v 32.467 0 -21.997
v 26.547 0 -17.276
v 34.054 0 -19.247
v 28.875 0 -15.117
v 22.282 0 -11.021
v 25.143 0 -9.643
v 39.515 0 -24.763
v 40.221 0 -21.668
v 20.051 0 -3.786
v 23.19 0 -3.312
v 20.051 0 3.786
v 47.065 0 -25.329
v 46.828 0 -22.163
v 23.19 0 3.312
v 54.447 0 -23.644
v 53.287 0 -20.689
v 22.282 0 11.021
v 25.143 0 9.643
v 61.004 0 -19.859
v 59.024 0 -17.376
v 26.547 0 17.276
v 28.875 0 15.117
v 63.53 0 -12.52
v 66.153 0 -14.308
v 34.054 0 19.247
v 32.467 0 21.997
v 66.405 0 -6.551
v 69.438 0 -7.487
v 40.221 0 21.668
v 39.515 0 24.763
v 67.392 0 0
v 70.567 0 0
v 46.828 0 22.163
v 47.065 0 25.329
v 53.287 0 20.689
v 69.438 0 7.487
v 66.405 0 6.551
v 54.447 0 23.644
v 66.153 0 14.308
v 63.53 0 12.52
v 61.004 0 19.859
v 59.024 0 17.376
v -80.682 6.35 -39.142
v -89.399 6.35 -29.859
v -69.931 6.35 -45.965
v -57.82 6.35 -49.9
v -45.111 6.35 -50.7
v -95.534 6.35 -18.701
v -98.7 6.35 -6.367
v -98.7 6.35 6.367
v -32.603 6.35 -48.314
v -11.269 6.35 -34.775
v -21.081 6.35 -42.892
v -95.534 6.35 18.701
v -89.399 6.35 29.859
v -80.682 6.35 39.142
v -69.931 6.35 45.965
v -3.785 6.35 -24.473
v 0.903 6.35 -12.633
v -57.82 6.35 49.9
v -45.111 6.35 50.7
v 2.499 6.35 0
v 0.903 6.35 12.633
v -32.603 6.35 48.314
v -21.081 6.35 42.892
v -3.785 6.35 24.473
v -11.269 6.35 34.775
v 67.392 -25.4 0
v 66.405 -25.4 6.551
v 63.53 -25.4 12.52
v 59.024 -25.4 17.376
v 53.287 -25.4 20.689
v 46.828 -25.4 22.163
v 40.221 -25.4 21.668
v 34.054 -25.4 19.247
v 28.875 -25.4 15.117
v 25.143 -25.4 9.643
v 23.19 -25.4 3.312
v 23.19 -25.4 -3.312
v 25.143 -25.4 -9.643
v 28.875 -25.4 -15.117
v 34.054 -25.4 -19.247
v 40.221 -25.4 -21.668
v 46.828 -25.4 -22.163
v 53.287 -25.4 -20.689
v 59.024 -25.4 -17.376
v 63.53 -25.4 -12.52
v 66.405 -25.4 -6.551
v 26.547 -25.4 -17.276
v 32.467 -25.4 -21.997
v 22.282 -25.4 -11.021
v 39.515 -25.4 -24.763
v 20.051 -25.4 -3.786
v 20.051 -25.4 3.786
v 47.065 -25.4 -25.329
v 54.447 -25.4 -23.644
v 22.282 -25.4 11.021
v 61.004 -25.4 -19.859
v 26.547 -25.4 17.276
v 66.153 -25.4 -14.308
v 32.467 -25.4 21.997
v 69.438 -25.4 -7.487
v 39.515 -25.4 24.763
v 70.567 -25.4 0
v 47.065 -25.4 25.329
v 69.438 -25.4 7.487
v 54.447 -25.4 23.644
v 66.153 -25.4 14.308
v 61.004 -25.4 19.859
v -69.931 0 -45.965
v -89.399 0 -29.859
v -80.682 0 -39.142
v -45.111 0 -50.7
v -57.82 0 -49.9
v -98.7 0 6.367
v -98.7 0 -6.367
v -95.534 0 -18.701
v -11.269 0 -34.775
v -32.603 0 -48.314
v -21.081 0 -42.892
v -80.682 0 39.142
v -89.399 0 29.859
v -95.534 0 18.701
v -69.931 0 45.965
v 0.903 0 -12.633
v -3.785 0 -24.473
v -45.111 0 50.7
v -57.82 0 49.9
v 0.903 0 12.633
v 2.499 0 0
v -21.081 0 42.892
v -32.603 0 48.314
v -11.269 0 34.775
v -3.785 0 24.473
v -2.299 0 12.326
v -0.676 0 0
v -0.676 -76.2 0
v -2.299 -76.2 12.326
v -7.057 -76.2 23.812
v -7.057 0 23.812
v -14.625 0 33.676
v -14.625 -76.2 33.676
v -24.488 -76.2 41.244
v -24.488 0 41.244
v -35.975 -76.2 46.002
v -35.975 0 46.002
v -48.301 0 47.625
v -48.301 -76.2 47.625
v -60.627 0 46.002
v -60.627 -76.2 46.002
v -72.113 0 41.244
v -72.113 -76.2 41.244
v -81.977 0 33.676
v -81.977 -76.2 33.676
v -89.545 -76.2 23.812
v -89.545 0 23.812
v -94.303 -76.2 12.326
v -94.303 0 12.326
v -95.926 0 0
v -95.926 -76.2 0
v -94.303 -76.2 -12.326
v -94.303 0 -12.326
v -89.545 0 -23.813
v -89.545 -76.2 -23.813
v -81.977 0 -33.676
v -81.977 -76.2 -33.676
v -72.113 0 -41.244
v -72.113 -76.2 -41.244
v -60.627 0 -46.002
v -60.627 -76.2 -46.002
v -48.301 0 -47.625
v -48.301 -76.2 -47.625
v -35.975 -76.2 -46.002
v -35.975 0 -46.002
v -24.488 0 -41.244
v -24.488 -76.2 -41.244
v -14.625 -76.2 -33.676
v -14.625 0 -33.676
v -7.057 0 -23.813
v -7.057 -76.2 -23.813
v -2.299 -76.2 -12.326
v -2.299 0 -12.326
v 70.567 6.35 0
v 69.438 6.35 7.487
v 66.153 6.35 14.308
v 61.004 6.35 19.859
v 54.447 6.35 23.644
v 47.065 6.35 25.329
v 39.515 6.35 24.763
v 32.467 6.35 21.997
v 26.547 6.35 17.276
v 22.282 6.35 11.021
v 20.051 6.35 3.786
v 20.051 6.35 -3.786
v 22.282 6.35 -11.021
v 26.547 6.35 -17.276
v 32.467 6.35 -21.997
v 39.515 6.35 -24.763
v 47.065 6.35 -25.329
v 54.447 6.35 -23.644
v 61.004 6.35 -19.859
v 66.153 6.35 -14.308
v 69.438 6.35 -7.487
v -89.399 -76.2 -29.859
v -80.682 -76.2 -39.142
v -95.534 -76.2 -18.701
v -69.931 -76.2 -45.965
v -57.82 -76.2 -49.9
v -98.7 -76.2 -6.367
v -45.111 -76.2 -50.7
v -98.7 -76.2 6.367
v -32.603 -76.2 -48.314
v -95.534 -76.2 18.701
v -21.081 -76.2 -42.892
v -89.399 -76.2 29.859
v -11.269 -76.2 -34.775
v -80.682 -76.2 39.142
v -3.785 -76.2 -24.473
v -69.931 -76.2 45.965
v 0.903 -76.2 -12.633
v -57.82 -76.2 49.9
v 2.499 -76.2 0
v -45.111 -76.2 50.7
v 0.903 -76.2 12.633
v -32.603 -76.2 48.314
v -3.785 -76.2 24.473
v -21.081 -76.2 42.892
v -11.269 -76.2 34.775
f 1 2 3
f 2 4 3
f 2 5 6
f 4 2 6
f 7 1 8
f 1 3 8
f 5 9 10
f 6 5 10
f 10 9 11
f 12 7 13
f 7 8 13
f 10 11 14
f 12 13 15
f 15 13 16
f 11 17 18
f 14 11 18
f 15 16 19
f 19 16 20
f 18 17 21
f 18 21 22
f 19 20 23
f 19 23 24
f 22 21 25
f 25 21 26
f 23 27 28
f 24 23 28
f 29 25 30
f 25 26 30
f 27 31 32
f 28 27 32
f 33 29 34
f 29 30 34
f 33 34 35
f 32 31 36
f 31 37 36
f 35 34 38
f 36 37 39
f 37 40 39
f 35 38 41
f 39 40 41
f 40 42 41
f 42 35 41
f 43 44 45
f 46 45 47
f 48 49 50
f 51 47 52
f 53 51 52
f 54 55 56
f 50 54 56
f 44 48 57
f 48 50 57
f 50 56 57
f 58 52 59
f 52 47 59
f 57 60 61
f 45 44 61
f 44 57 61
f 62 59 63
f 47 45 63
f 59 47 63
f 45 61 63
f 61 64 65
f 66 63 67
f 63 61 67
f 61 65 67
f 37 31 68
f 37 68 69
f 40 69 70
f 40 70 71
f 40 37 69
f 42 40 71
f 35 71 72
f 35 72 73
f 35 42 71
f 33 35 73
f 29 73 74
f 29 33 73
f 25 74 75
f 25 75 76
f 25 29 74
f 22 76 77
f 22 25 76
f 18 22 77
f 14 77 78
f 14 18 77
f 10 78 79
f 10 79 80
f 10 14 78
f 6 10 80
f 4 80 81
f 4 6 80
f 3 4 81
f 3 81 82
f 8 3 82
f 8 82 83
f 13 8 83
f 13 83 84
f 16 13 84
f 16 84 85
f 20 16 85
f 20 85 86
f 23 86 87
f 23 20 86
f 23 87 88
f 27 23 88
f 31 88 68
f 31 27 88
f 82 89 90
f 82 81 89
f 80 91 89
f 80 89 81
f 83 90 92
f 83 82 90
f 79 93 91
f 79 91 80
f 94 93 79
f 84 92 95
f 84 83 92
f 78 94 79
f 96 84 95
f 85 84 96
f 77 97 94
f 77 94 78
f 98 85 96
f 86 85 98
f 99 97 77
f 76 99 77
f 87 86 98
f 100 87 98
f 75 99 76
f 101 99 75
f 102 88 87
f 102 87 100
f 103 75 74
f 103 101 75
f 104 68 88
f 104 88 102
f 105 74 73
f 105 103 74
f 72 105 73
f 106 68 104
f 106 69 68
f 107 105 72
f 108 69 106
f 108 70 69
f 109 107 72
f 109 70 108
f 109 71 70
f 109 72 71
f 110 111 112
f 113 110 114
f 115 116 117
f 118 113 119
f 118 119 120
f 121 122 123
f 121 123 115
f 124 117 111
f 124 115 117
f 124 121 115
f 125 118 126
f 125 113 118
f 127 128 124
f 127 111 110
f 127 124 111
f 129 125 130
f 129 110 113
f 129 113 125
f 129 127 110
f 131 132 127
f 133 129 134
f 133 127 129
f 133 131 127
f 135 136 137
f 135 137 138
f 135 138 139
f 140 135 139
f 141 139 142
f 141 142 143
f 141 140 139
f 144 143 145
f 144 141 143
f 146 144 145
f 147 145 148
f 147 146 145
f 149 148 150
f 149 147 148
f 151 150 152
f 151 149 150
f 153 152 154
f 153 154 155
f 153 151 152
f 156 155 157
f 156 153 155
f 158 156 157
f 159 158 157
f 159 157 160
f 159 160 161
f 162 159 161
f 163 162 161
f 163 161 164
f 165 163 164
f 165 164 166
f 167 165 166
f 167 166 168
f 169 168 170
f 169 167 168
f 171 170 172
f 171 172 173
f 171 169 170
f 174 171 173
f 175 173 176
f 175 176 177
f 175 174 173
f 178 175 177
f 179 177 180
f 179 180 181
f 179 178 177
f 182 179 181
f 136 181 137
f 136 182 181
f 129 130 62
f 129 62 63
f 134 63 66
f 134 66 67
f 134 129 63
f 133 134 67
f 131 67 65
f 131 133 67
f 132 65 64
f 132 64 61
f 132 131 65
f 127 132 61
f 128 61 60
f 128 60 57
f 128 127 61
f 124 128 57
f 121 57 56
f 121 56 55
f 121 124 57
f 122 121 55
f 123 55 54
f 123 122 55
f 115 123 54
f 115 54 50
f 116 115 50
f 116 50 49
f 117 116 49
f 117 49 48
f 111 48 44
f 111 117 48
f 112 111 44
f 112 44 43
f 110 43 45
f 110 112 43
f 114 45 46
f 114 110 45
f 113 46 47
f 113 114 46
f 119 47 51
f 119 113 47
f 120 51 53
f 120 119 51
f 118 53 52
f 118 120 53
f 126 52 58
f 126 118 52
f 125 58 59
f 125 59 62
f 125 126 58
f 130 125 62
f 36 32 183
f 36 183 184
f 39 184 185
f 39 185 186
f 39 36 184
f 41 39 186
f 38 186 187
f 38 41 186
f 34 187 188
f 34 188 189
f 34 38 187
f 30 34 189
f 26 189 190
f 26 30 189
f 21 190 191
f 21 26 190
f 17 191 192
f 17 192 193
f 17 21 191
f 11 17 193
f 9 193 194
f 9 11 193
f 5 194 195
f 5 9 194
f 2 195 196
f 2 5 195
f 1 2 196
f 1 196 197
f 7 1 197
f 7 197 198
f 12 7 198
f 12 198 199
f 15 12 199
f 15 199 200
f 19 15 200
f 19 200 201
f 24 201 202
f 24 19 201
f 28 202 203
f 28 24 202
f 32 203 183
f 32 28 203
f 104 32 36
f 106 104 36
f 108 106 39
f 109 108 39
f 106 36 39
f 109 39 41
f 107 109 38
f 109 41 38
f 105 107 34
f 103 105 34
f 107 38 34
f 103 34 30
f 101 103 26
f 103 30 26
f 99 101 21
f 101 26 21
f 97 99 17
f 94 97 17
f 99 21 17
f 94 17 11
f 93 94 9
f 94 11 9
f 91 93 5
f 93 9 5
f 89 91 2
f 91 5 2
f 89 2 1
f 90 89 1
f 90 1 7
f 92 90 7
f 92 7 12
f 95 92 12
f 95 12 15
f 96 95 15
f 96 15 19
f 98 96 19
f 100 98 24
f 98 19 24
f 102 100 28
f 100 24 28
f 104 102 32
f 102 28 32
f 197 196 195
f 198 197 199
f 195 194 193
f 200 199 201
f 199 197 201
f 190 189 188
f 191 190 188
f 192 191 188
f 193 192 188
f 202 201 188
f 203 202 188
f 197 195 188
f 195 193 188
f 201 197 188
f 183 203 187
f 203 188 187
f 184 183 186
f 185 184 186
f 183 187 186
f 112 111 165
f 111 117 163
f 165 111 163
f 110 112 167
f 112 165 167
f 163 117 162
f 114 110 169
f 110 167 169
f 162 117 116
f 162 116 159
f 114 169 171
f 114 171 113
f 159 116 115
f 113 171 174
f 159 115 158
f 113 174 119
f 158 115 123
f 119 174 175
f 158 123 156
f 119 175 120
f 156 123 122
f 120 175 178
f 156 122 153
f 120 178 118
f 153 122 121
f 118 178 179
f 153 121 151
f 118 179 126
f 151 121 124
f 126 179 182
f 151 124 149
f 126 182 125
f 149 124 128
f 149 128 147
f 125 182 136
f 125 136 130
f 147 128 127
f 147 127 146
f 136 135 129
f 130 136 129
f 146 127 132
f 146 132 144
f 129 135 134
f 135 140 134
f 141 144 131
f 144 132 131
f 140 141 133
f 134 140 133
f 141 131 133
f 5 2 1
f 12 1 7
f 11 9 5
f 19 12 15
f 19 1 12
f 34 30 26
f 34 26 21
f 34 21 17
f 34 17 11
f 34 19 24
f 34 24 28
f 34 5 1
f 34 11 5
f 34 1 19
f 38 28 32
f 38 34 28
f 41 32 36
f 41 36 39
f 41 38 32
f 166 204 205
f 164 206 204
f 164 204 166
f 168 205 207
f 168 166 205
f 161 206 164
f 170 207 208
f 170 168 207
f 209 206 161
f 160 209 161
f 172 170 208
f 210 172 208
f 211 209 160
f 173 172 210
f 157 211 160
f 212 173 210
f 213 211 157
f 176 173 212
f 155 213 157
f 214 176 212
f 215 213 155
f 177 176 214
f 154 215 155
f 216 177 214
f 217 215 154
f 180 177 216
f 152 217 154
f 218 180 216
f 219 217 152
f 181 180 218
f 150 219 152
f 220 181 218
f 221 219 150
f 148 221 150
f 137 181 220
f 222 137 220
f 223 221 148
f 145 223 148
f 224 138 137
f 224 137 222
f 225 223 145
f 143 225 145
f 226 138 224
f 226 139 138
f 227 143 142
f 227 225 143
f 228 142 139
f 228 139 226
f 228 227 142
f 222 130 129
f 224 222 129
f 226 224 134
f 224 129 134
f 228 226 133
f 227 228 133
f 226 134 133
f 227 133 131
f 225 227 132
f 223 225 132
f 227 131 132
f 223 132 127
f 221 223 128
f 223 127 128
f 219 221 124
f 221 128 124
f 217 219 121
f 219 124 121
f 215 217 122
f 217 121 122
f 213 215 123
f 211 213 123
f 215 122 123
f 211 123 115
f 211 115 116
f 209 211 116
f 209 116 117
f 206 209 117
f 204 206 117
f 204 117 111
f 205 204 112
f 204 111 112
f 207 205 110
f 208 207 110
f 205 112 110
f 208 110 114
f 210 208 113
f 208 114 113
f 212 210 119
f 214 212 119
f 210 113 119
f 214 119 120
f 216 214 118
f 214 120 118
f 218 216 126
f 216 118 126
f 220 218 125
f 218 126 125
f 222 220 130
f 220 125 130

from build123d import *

# Parameters (mm, degrees)
F0_R     = 50.8
F0_R_2   = 47.625
F1_DEPTH = 6.35
F0_R_3   = 25.4
F0_R_4   = 22.225
F2_DEPTH = 76.2
F3_DEPTH = 25.4


with BuildPart() as f1:
    # F0 (on Front) → F1 (new body)
    with BuildSketch(Plane.XZ):
        with Locations((-48.3009703457, 0)):
            Circle(F0_R)
        with Locations((-48.3009703457, 0)):
            Circle(F0_R_2, mode=Mode.SUBTRACT)
        with Locations((-48.3009703457, 0)):
            Circle(F0_R_2)
    extrude(amount=-F1_DEPTH)


with BuildPart() as f1b:
    # F0 (on Front) → F1, piece 2 (new body)
    with BuildSketch(Plane.XZ):
        with Locations((45.1669357717, 0)):
            Circle(F0_R_3)
        with Locations((45.1669357717, 0)):
            Circle(F0_R_4, mode=Mode.SUBTRACT)
        with Locations((45.1669357717, 0)):
            Circle(F0_R_4)
    extrude(amount=-F1_DEPTH)


with BuildPart() as f2:
    # F0 (on Front) → F2 (new body)
    with BuildSketch(Plane.XZ):
        with Locations((-48.3009703457, 0)):
            Circle(F0_R)
        with Locations((-48.3009703457, 0)):
            Circle(F0_R_2, mode=Mode.SUBTRACT)
    extrude(amount=F2_DEPTH)


with BuildPart() as f3:
    # F0 (on Front) → F3 (new body)
    with BuildSketch(Plane.XZ):
        with Locations((45.1669357717, 0)):
            Circle(F0_R_3)
        with Locations((45.1669357717, 0)):
            Circle(F0_R_4, mode=Mode.SUBTRACT)
    extrude(amount=F3_DEPTH)


solid = Compound([f1.part, f1b.part, f2.part, f3.part])
